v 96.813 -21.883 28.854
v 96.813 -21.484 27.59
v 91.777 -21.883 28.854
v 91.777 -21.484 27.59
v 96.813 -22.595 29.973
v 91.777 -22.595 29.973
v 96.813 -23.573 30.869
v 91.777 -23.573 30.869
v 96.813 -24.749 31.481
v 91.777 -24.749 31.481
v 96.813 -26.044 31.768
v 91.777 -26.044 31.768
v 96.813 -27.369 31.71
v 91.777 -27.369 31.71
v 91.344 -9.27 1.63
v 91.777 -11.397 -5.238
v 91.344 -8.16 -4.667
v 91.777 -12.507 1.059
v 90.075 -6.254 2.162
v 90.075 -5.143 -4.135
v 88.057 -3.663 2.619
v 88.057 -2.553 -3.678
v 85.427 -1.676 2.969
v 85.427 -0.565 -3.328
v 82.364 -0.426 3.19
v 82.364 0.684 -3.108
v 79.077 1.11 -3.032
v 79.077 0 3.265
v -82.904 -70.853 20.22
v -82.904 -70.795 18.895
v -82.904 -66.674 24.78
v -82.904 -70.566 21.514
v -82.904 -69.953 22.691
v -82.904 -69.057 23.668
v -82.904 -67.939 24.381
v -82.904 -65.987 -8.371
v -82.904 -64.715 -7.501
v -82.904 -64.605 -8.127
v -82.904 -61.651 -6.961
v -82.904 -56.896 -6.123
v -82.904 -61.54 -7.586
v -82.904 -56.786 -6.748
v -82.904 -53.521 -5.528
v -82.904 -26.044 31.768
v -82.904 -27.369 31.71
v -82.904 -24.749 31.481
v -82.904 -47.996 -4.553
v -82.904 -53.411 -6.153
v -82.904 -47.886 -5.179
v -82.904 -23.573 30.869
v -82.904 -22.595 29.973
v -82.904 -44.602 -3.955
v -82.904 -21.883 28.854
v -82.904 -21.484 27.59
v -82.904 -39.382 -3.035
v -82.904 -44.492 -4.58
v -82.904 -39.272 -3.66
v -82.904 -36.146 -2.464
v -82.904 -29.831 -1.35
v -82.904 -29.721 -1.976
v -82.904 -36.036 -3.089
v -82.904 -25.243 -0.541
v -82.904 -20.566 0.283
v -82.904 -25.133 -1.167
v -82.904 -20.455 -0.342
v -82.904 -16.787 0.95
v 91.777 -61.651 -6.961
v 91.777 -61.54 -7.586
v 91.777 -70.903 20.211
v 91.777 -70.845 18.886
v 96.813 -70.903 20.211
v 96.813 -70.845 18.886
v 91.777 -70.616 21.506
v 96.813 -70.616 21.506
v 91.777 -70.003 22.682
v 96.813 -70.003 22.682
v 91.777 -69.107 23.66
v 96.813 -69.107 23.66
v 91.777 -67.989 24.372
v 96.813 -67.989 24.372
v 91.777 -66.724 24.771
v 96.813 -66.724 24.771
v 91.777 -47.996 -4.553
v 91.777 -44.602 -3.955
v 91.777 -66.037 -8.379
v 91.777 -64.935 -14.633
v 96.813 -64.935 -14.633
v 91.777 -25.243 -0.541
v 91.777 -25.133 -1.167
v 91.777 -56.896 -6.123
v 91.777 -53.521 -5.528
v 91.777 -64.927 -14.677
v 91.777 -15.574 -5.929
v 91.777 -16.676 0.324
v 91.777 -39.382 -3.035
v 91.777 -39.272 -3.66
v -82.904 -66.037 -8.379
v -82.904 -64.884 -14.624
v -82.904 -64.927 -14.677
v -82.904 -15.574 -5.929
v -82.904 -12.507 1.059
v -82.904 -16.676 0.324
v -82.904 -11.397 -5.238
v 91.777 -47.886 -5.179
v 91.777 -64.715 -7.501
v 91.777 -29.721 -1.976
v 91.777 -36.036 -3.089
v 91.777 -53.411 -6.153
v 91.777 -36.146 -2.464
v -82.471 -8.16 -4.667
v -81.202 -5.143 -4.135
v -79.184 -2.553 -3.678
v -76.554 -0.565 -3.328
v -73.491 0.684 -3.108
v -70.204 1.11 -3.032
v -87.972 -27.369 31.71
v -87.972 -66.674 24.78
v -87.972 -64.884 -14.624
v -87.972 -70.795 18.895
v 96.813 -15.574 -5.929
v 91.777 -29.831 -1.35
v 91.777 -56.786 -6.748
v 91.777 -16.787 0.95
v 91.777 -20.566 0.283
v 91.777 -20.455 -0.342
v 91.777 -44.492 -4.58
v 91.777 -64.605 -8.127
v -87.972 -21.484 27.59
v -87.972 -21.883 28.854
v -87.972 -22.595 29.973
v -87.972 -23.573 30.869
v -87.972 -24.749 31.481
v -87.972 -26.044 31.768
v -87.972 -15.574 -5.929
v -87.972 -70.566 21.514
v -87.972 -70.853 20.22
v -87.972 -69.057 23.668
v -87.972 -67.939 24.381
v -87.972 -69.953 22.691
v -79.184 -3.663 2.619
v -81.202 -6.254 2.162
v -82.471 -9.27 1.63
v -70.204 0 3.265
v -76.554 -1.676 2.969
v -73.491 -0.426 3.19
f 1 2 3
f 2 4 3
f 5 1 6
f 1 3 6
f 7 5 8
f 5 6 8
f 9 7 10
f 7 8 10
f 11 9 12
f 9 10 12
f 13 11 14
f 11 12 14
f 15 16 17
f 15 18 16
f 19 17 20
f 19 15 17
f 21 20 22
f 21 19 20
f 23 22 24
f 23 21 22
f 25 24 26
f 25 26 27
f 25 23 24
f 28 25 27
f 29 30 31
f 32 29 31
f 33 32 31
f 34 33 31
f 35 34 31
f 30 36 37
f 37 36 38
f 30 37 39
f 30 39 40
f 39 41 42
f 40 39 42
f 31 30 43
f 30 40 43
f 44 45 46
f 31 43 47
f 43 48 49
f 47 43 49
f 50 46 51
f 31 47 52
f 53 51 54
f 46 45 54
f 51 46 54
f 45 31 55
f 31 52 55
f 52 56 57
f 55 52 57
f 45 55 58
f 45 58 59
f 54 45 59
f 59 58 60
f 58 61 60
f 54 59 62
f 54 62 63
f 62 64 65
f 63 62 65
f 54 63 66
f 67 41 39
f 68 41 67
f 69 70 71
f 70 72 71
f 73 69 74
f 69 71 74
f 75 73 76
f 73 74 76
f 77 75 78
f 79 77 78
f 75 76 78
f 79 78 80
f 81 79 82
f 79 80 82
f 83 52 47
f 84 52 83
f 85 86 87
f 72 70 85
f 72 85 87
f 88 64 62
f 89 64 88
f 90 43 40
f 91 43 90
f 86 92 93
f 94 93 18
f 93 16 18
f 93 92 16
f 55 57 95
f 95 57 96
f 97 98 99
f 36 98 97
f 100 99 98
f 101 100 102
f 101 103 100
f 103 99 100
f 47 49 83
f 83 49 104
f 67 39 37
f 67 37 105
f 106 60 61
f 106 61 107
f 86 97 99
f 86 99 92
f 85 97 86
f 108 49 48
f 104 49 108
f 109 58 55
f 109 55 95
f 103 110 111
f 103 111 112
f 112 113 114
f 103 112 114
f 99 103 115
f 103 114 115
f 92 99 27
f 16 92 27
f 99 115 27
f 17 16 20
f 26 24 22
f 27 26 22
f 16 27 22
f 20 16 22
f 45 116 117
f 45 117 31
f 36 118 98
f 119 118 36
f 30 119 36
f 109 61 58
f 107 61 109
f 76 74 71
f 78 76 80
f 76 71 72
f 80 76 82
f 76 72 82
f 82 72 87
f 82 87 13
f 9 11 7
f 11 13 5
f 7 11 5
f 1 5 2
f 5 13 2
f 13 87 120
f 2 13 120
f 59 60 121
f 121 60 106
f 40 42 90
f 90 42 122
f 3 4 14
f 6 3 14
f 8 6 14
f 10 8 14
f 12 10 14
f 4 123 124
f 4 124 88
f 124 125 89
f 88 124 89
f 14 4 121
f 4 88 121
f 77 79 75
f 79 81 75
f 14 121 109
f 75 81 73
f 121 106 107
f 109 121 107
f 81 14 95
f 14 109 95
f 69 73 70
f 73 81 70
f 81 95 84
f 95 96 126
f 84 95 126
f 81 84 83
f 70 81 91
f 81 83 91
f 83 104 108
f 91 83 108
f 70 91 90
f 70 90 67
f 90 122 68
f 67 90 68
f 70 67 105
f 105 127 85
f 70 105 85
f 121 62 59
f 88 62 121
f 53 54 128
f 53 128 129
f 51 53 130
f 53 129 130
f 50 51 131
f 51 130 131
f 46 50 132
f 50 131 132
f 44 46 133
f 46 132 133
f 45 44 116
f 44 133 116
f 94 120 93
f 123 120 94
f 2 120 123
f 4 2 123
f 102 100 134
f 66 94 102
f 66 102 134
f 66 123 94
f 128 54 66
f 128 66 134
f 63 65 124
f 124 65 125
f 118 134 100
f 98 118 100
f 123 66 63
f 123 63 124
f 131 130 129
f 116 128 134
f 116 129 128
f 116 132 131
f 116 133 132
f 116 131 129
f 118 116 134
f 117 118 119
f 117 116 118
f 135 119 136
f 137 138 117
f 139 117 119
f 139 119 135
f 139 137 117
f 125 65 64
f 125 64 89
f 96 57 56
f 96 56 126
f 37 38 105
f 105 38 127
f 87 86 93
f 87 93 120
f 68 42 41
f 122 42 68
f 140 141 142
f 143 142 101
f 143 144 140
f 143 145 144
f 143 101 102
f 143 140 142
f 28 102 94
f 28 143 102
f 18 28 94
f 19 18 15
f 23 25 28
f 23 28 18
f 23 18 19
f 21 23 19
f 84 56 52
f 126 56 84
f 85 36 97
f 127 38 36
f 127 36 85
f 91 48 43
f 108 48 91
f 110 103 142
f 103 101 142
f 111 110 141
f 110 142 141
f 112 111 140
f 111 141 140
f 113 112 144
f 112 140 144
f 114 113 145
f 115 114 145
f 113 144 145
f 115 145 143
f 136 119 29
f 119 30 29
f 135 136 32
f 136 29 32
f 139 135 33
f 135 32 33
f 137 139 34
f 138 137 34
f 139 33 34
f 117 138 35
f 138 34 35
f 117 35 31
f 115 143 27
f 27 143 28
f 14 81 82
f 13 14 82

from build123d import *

# Parameters (mm, degrees)
F0_W          = 174.6804863214
F0_H          = 6.394301774
F1_DEPTH      = 67.056
F2_R          = 12.7
F3_ANGLE      = 10
F4_W          = 174.6804863214
F4_H          = 3.8374643773
F4_H_2        = 3.2865575018
F4_H_3        = 4.6590082347
F4_H_4        = 3.4464076161
F4_H_5        = 3.4266933799
F4_H_6        = 3.1117796898
F5_DEPTH      = 0.635
F6_DEPTH      = 32.766
F6_DEPTH_BACK = 6.35
F7_R          = 5.08


with BuildPart() as f1:
    # F0 (on Front) → F1 (new body)
    with BuildSketch(Plane.XZ):
        with Locations((4.4365723152, 0.0675924821)):
            Rectangle(F0_W, F0_H)
    extrude(amount=F1_DEPTH)

    # F2
    f2_edges = [f1.edges().sort_by_distance(p)[0] for p in [
        (-82.903671, 0, 0.067592),
        (91.776815, 0, 0.067592),
    ]]
    fillet(f2_edges, radius=F2_R)


with BuildPart() as f1_1:
    # F3: moved
    add(f1.part.rotate(Axis((4.4365723152, 0, 3.2647433691), (1, 0, 0)), F3_ANGLE))

    # F4 (on face) → F5 (join)
    with BuildSketch(Plane(origin=(0, -0.5583039975, 3.1662993109), x_dir=(1, 0, 0), z_dir=(0, -0.1736481777, 0.984807753))):
        with Locations((4.4365723152, -18.2853909209)):
            Rectangle(F4_W, F4_H)
        with Locations((4.4365723152, -37.6678045125)):
            Rectangle(F4_W, F4_H_2)
        with Locations((4.4365723152, -27.2829253227)):
            Rectangle(F4_W, F4_H_3)
        with Locations((4.4365723152, -46.3344976306)):
            Rectangle(F4_W, F4_H_4)
        with Locations((4.4365723152, -55.3813166916)):
            Rectangle(F4_W, F4_H_5)
        with Locations((4.4365723152, -63.4787082672)):
            Rectangle(F4_W, F4_H_6)
    extrude(amount=F5_DEPTH)

    # F4 (on face) → F6 (join, two sides)
    with BuildSketch(Plane(origin=(0, -0.5583039975, 3.1662993109), x_dir=(1, 0, 0), z_dir=(0, -0.1736481777, 0.984807753))) as f6_sk:
        Polygon((-82.9036708456, -66.4382055402), (-82.9036708456, -65.0345981121), (-82.9036708456, -61.9228184223), (-82.9036708456, -57.0946633816), (-82.9036708456, -53.6679700017), (-82.9036708456, -48.0577014387), (-82.9036708456, -44.6112938225), (-82.9036708456, -39.3110832634), (-82.9036708456, -36.0245257616), (-82.9036708456, -29.61242944), (-82.9036708456, -24.9534212053), (-82.9036708456, -20.2041231096), (-82.9036708456, -16.3666587323), (-87.9721194506, -16.3666587323), (-87.9721194506, -66.4382055402), align=None)
        Polygon((91.7768154759, -61.9228184223), (91.7768154759, -65.0345981121), (91.7768154759, -66.4890832634), (96.8134328723, -66.4890832634), (96.8134328723, -16.3666587323), (91.7768154759, -16.3666587323), (91.7768154759, -20.2041231096), (91.7768154759, -24.9534212053), (91.7768154759, -29.61242944), (91.7768154759, -36.0245257616), (91.7768154759, -39.3110832634), (91.7768154759, -44.6112938225), (91.7768154759, -48.0577014387), (91.7768154759, -53.6679700017), (91.7768154759, -57.0946633816), align=None)
    extrude(amount=F6_DEPTH)
    extrude(f6_sk.sketch, amount=-F6_DEPTH_BACK)

    # F7
    f7_edges = [f1_1.edges().sort_by_distance(p)[0] for p in [
        (94.295124, -22.366073, 32.59247),
        (-85.437895, -22.366073, 32.59247),
        (-85.437895, -71.67692, 23.897637),
        (94.295124, -71.727025, 23.888802),
    ]]
    fillet(f7_edges, radius=F7_R)


solid = f1_1.part
